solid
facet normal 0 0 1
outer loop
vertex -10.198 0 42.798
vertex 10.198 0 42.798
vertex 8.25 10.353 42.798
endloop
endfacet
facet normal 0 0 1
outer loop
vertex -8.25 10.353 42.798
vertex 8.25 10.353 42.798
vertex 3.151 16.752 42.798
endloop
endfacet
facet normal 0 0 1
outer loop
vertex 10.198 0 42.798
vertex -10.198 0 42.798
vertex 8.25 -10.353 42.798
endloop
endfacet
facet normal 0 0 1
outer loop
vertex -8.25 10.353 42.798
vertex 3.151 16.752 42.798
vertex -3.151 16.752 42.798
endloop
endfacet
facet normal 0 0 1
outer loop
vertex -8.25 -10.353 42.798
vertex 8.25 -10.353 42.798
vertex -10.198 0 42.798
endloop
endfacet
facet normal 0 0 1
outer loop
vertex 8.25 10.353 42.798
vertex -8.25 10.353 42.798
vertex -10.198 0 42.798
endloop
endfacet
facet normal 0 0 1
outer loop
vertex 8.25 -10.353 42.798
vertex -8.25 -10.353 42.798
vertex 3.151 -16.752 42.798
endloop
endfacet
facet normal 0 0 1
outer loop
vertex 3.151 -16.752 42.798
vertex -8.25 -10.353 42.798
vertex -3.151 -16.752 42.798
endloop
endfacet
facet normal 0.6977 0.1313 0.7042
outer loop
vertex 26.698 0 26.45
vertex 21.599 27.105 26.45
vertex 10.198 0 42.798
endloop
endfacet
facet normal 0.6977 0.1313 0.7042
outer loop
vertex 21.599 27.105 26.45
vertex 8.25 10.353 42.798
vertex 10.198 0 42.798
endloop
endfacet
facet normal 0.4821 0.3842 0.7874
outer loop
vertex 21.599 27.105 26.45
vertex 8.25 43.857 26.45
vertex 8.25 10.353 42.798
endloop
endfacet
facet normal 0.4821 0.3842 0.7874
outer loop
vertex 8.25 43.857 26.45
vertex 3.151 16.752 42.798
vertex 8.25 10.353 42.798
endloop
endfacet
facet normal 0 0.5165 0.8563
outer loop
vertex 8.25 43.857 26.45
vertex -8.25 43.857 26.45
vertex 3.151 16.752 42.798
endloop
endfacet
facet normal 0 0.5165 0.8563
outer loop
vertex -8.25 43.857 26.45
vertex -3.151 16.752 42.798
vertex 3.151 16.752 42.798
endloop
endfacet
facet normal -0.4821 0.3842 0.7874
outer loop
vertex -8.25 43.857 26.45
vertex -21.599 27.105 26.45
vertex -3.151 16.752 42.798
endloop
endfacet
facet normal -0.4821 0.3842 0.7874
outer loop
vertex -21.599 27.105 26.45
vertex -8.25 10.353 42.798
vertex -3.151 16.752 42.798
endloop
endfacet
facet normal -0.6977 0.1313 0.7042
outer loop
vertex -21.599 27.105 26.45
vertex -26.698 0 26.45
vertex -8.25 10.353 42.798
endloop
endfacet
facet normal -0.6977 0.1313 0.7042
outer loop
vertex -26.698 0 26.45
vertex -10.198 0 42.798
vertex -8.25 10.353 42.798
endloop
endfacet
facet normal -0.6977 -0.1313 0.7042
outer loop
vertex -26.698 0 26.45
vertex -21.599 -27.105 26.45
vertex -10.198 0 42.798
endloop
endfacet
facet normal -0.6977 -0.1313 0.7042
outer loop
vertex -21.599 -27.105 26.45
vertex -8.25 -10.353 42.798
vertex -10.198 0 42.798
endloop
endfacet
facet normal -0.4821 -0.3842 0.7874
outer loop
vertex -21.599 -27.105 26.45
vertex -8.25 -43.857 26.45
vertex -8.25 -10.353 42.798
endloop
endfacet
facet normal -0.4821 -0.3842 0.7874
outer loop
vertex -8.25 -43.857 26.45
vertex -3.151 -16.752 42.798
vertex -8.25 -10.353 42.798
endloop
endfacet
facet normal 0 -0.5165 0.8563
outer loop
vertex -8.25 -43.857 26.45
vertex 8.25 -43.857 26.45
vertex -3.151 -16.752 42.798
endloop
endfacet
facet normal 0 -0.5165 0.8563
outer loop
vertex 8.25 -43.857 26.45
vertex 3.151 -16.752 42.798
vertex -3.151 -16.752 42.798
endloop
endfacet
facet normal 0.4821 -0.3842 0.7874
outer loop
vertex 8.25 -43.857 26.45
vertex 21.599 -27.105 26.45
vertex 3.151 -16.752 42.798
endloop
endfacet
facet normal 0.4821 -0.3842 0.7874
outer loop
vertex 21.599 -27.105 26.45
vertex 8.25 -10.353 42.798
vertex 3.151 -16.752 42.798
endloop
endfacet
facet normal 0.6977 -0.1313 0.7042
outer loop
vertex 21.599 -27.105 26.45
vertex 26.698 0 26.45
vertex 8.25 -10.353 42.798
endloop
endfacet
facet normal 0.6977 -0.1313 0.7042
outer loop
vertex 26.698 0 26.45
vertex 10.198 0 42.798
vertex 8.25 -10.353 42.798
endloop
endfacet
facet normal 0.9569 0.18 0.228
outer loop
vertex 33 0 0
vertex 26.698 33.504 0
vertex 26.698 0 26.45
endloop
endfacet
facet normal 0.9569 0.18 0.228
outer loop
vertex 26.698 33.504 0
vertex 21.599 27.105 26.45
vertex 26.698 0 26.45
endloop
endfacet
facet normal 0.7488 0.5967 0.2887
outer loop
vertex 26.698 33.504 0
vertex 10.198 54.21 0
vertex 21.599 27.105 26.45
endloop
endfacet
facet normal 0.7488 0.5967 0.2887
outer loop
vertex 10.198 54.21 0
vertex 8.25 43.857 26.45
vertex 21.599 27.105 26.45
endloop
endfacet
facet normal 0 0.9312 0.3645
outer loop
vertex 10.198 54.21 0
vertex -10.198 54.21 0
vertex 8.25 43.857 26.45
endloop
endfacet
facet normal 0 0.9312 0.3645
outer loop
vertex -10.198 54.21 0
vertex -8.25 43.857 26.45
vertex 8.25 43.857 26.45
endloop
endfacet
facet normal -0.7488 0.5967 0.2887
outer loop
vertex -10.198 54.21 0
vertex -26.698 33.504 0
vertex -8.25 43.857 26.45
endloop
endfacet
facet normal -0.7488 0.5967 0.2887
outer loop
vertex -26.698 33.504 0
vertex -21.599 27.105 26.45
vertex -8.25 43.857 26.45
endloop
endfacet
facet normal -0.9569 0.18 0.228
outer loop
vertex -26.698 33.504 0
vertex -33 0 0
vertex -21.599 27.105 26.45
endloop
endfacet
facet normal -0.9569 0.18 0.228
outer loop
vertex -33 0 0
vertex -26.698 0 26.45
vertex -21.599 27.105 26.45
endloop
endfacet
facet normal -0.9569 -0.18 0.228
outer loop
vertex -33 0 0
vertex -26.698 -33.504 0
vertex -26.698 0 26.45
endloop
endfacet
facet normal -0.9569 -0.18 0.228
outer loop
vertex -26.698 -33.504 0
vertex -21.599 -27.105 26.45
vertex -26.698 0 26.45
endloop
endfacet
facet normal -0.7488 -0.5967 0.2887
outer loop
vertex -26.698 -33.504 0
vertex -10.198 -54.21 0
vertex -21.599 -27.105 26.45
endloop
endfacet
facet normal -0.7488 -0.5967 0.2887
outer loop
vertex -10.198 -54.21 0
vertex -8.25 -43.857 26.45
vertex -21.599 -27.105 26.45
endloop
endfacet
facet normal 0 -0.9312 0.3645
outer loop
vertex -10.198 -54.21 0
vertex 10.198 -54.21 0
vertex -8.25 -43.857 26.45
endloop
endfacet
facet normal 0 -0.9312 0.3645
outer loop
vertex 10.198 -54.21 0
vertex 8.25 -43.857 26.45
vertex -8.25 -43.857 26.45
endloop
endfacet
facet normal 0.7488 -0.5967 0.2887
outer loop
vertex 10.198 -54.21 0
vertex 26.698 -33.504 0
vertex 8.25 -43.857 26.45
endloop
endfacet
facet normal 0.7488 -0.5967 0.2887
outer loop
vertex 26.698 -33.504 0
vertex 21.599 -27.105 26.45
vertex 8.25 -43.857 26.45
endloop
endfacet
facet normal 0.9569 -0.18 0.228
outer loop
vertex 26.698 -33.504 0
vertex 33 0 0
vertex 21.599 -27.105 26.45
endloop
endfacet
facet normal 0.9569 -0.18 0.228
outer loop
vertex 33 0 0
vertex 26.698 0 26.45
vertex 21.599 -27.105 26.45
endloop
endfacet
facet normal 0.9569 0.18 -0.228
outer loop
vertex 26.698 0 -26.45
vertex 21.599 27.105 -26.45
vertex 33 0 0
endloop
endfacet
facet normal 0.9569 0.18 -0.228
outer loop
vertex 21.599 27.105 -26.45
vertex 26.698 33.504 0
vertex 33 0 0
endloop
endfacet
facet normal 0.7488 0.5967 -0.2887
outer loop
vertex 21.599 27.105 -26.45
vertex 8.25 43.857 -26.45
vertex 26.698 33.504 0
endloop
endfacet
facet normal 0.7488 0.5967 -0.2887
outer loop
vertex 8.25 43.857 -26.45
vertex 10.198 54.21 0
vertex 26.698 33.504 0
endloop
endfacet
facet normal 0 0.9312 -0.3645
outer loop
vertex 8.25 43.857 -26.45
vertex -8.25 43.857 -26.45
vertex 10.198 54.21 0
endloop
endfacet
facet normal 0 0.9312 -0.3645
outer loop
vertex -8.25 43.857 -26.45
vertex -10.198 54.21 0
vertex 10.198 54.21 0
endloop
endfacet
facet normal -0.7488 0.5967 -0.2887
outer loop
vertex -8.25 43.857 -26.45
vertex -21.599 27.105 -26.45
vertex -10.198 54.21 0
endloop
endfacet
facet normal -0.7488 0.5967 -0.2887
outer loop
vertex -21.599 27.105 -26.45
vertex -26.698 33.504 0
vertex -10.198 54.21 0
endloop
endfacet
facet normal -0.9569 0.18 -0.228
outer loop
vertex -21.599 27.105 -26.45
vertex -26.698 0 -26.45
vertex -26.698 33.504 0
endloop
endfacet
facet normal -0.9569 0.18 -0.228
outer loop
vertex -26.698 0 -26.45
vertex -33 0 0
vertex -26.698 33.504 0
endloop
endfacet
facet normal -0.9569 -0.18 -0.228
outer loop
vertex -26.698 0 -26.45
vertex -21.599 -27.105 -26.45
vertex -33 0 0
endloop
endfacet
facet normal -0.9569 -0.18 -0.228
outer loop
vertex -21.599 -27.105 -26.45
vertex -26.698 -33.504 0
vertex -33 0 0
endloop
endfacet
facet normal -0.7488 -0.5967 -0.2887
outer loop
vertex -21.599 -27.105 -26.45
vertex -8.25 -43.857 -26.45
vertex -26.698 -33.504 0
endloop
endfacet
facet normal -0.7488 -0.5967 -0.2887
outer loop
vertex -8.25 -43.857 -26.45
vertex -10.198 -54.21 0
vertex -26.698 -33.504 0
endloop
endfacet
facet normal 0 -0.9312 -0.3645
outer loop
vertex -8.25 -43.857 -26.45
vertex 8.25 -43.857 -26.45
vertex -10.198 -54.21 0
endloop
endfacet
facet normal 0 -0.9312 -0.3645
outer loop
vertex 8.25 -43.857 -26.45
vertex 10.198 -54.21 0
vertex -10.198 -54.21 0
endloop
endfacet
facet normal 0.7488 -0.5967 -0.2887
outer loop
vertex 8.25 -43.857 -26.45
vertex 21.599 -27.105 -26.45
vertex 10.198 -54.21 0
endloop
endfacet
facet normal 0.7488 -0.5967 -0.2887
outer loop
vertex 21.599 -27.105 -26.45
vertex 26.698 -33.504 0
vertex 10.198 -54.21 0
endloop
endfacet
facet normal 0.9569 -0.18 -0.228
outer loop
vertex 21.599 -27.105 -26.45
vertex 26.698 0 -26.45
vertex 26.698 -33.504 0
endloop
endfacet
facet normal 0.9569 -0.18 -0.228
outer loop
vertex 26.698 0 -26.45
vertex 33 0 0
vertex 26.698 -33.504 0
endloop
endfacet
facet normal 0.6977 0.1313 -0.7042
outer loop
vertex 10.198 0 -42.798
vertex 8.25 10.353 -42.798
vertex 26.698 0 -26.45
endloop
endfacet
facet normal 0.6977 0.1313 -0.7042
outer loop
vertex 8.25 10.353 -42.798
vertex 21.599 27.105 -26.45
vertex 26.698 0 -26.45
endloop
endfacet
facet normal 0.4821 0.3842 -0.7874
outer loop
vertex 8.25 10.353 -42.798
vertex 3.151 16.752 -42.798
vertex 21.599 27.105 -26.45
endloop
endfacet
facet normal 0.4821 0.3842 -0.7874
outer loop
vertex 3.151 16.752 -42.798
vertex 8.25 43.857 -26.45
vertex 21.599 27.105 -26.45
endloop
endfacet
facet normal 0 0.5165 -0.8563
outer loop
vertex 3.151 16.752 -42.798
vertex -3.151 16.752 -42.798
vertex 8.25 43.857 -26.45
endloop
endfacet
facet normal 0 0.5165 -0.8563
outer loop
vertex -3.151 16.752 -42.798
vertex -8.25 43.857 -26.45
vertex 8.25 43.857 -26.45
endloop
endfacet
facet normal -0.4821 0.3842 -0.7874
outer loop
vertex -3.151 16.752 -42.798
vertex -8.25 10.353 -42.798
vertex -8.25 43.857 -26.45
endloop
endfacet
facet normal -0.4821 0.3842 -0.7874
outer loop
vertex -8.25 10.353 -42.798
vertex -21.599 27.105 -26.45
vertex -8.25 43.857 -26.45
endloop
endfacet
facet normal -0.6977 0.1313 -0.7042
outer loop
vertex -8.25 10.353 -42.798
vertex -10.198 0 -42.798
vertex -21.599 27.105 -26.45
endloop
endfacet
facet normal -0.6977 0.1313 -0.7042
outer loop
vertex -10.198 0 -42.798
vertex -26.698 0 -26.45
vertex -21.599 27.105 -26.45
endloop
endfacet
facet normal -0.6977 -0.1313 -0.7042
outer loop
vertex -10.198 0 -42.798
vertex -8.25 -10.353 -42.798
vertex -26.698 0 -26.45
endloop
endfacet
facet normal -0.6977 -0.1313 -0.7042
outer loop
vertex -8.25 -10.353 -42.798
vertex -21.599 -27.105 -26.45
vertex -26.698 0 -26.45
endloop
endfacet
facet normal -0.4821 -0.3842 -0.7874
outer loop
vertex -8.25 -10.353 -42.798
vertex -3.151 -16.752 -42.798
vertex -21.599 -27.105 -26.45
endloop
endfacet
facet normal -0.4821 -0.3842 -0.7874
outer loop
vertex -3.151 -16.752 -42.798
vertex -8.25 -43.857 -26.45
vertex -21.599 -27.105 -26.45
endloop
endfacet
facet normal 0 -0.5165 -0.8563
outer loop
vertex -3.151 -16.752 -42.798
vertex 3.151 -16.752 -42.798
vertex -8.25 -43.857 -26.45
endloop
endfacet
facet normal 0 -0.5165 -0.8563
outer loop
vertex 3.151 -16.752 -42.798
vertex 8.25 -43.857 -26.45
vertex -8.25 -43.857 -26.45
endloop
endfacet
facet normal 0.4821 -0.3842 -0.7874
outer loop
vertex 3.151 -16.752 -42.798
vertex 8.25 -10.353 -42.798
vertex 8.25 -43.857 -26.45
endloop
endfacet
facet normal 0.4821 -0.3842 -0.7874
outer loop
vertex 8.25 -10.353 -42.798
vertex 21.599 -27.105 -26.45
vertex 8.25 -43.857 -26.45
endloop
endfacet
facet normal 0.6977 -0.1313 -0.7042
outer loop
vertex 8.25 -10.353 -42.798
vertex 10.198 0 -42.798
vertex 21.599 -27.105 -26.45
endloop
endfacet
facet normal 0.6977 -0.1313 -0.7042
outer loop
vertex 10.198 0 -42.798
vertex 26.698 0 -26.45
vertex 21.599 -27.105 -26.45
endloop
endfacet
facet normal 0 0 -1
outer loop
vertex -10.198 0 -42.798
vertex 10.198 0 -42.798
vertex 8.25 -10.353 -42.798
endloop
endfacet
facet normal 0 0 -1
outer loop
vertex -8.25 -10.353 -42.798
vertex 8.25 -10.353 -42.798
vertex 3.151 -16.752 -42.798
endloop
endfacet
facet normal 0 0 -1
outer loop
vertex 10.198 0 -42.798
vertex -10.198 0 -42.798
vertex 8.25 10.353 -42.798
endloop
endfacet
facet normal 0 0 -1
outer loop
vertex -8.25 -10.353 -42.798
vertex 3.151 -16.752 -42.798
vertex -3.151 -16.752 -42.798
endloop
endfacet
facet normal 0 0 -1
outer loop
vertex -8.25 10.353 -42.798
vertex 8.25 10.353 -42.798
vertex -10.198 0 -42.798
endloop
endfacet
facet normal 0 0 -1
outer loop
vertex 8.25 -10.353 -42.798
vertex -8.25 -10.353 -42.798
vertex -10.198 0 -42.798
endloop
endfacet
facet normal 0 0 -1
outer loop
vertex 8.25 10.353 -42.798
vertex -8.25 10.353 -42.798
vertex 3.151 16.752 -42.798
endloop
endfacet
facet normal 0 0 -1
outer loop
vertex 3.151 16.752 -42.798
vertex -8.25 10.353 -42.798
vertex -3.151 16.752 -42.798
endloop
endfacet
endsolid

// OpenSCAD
// Generated by SolidPython 1.0.1 on 2020-07-29 00:46:50


scale(v = [11, 19, 15]) {
	sphere(r = 3);
}
/***********************************************
*********      SolidPython code:      **********
************************************************
 
# import packages: SolidPython
from solid import *
from solid.utils import *
from itertools import chain, combinations, permutations


class Resize:

    def __init__(self, scad_file):
        self.scad_file = scad_file
        #self.scad_file = import_scad(scad_file)
        # cone/cylinder param:
        self.r1 = 0
        self.r2 = 0
        self.h = 0
        # rectangular prism param:
        self.w = 0
        self.l = 0
        # ellipse param:
        self.r = 0

    # import OpenScad code (file name corresponds to shape)


    # classify shape + parameters
    def assign(self, param1, param2, param3):
        if self.scad_file == 'cone.scad':
            self.r1 = param1
            self.r2 = param2
            self.h = param3
        elif self.scad_file == 'cylinder.scad':
            self.r1 = param1
            self.r2 = param2
            self.h = param3
        elif self.scad_file == 'rectangularPrism.scad':
            self.h = param1
            self.l = param2
            self.w = param3
        else:
            self.r = param1
            self.h = param2

    # resize parameters
    def iterate(self):
        x = range(3, 20, 2)
        i = 1
        if self.scad_file == 'cone.scad':
            tempList = list(permutations(x, 2))
            for temp in tempList:
                param1 = temp[0]
                param2 = temp[1]
                filepath = 'produced_scad_files/' + 'cone' + str(param1) + '_' + str(param2) + '_' + '.scad'
                scad_render_to_file(cylinder(h=param1, r1=param2, r2=0), filepath)

        elif self.scad_file == 'cylinder.scad':
            tempList = list(permutations(x, 3))
            for temp in tempList:
                param1 = temp[0]
                param2 = temp[1]
                filepath = 'produced_scad_files/' + 'cylinder' + str(param1) + '_' + str(param2) + '_' + '.scad'
                scad_render_to_file(cylinder(h=param1, r1=param2, r2=param2), filepath)

        elif self.scad_file == 'rectangularPrism.scad':
            tempList = list(permutations(x, 3))
            for temp in tempList:
                param1 = temp[0]
                param2 = temp[1]
                param3 = temp[2]
                filepath = 'produced_scad_files/' + 'rectangularPrism' + str(param1) + '_' + str(param2) + '_' + str(
                    param3) + '.scad'
                scad_render_to_file(cube(size=(param1, param2, param3)), filepath)

        elif self.scad_file == 'ellipse.scad':
            tempList = list(permutations(x, 4))
            for temp in tempList:
                param1 = temp[0]
                param2 = temp[1]
                param3 = temp[2]
                param4 = temp[3]
                filepath = 'produced_scad_files/' + 'ellipse' + str(param1) + '_' + str(param2) + '_' + str(param3) + '_' + str(param4) + '.scad'
                scad_render_to_file(scale([param1, param2, param3])(sphere(r=param4)), filepath)

    def render_to_scadfile(self):
        scad_render_to_file(scad, 'example.scad') 
 
************************************************/
